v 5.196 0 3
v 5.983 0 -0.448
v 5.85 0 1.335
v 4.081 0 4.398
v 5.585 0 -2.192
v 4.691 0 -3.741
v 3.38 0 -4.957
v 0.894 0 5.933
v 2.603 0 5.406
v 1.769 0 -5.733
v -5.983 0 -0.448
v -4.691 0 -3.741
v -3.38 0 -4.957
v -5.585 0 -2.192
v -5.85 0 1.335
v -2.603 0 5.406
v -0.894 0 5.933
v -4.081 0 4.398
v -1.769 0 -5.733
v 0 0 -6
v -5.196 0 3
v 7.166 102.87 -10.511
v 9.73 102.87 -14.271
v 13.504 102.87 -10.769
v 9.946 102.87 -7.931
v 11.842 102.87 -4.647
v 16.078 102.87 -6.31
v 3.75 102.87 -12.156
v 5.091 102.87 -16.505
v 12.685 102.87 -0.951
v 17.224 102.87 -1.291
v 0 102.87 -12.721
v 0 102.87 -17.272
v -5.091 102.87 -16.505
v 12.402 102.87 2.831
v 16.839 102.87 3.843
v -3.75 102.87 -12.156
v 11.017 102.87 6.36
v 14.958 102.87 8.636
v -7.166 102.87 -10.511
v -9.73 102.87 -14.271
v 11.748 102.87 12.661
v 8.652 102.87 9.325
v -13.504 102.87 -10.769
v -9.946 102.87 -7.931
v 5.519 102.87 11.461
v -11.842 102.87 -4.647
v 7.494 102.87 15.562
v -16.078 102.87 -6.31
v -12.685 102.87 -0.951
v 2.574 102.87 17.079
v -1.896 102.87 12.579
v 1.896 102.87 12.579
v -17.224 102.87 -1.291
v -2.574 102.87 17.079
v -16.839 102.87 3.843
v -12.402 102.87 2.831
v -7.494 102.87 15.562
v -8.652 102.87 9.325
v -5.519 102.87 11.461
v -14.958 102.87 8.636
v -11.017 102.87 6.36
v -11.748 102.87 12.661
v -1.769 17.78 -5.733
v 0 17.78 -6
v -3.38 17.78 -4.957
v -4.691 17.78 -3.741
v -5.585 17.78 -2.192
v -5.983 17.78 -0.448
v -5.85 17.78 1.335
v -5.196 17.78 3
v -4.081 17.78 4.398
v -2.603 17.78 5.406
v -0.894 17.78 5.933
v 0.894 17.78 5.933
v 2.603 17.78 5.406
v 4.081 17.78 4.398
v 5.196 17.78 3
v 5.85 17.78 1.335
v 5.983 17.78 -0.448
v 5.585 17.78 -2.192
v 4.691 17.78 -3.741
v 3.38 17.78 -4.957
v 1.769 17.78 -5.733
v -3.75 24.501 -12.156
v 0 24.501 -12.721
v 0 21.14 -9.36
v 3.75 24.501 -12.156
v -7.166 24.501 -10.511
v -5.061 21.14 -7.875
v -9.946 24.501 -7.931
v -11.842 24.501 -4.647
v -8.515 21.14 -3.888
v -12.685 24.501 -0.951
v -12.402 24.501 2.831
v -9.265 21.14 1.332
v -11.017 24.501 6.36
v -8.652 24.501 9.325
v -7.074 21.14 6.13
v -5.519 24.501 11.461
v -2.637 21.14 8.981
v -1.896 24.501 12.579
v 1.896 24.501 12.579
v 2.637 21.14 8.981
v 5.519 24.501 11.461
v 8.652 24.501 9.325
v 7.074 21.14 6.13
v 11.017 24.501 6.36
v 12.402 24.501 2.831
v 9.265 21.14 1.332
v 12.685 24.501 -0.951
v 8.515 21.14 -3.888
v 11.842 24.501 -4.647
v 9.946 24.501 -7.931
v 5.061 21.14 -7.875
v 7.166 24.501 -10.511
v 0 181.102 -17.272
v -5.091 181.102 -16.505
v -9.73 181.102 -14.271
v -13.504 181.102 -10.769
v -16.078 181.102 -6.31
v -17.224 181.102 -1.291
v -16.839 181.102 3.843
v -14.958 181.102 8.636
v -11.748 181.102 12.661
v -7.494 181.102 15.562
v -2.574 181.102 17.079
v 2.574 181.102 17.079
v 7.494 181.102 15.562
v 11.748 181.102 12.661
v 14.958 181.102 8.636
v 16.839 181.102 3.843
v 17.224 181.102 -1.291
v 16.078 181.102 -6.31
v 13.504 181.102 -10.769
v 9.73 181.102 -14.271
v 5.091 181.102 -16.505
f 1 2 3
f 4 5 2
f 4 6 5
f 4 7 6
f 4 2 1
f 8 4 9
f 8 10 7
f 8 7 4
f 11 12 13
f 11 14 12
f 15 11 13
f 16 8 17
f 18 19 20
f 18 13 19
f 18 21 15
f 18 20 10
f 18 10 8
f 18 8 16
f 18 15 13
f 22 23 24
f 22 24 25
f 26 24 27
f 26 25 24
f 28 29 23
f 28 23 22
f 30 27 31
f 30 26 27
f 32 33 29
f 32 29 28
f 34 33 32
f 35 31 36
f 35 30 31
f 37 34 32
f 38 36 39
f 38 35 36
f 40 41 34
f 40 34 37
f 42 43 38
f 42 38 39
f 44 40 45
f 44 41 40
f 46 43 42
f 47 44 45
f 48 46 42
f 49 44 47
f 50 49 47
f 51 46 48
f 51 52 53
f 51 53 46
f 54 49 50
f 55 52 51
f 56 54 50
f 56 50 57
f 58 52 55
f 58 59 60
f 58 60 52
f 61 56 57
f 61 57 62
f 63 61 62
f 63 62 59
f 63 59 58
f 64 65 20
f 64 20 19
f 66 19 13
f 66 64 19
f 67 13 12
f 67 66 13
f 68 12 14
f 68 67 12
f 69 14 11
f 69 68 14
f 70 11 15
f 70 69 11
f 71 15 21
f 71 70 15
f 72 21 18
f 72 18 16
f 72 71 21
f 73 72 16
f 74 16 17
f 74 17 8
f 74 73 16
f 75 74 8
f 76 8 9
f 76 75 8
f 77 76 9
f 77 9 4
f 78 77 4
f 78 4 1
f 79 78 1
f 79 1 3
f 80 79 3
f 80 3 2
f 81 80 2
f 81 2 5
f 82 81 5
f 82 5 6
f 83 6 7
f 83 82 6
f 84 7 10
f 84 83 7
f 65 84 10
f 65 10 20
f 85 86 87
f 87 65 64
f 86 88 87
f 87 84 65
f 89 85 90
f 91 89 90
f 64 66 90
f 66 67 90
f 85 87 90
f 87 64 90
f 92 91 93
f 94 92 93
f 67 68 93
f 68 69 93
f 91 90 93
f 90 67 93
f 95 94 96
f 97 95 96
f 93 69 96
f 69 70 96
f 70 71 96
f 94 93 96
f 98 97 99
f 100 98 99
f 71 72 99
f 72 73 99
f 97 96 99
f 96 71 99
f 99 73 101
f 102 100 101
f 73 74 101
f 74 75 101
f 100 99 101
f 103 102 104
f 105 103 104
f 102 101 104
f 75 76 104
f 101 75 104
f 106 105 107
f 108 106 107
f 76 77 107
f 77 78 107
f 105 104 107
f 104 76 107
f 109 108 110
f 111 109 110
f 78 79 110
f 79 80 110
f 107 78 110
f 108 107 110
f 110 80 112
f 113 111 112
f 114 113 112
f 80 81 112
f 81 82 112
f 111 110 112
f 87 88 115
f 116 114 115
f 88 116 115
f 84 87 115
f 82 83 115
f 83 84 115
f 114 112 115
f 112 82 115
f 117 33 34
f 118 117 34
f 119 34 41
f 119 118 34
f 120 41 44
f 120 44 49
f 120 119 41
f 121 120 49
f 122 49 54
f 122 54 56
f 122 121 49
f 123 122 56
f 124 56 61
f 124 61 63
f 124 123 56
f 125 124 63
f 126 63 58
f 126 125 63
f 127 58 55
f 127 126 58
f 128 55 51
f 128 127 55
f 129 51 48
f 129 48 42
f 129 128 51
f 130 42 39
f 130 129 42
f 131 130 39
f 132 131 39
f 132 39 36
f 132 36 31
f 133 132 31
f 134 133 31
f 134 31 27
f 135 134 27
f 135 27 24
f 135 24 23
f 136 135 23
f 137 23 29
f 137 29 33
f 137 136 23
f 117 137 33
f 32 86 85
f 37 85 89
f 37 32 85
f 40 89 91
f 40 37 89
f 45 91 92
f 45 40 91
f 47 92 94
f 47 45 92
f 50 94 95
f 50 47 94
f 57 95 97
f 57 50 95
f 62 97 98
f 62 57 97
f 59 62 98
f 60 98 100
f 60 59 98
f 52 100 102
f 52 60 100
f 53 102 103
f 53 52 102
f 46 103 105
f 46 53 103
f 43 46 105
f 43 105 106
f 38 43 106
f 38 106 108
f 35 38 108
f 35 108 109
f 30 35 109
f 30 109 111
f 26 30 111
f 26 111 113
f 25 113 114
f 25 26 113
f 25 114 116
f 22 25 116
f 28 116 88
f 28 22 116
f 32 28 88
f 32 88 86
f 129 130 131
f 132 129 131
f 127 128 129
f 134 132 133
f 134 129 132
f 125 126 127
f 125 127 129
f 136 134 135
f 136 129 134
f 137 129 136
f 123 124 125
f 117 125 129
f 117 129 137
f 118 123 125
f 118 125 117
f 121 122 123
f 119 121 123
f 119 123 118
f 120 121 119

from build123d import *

# Parameters (mm, degrees)
SKETCH2_W     = 12.720955
SKETCH2_H     = 33.02
SKETCH2_W_2   = 5.999999938
SKETCH2_H_2   = 25.4
CHAMFER1_SIZE = 7.62


with BuildPart() as part:
    # Sketch2 → Revolve1 (revolve)
    with BuildSketch(Plane.XY, mode=Mode.PRIVATE) as revolve1_sk:
        with Locations((6.3604775, 86.36)):
            Rectangle(SKETCH2_W, SKETCH2_H)
        Polygon((0, 181.102), (0, 102.87), (12.720955, 102.87), (17.272, 102.87), (17.272, 181.102), align=None)
        Polygon((0, 69.85), (0, 25.4), (5.999999938, 25.4), (12.720955, 25.4), (12.720955, 69.85), align=None)
        with Locations((2.999999969, 12.7)):
            Rectangle(SKETCH2_W_2, SKETCH2_H_2)
    revolve(revolve1_sk.sketch.rotate(Axis((0, 0, 0), (0, 1, 0)), 90), axis=Axis((0, 0, 0), (0, 1, 0)))

    # Chamfer1
    # the kernel refuses this chamfer: 7.62 mm, written as the material it adds along each edge
    with BuildSketch(Plane(origin=(0, 25.4, 0), x_dir=(0, 0, -1), z_dir=(1, 0, 0))) as chamfer1_piece_1_section:
        Polygon((5.999999938 + CHAMFER1_SIZE, 0), (5.999999938, -CHAMFER1_SIZE), (5.999999938, 0), align=None)
    chamfer1_piece_1 = revolve(axis=Axis((0, 25.4, 0), (0, 1, 0)), mode=Mode.PRIVATE)
    chamfer1_piece_1 = chamfer1_piece_1 & Plane(origin=(0, 21.11622986, 0), x_dir=(0, 0, -1), z_dir=(0, 1, 0)) * Cylinder(12.720955, 55, mode=Mode.PRIVATE)
    add(chamfer1_piece_1)


solid = part.part
